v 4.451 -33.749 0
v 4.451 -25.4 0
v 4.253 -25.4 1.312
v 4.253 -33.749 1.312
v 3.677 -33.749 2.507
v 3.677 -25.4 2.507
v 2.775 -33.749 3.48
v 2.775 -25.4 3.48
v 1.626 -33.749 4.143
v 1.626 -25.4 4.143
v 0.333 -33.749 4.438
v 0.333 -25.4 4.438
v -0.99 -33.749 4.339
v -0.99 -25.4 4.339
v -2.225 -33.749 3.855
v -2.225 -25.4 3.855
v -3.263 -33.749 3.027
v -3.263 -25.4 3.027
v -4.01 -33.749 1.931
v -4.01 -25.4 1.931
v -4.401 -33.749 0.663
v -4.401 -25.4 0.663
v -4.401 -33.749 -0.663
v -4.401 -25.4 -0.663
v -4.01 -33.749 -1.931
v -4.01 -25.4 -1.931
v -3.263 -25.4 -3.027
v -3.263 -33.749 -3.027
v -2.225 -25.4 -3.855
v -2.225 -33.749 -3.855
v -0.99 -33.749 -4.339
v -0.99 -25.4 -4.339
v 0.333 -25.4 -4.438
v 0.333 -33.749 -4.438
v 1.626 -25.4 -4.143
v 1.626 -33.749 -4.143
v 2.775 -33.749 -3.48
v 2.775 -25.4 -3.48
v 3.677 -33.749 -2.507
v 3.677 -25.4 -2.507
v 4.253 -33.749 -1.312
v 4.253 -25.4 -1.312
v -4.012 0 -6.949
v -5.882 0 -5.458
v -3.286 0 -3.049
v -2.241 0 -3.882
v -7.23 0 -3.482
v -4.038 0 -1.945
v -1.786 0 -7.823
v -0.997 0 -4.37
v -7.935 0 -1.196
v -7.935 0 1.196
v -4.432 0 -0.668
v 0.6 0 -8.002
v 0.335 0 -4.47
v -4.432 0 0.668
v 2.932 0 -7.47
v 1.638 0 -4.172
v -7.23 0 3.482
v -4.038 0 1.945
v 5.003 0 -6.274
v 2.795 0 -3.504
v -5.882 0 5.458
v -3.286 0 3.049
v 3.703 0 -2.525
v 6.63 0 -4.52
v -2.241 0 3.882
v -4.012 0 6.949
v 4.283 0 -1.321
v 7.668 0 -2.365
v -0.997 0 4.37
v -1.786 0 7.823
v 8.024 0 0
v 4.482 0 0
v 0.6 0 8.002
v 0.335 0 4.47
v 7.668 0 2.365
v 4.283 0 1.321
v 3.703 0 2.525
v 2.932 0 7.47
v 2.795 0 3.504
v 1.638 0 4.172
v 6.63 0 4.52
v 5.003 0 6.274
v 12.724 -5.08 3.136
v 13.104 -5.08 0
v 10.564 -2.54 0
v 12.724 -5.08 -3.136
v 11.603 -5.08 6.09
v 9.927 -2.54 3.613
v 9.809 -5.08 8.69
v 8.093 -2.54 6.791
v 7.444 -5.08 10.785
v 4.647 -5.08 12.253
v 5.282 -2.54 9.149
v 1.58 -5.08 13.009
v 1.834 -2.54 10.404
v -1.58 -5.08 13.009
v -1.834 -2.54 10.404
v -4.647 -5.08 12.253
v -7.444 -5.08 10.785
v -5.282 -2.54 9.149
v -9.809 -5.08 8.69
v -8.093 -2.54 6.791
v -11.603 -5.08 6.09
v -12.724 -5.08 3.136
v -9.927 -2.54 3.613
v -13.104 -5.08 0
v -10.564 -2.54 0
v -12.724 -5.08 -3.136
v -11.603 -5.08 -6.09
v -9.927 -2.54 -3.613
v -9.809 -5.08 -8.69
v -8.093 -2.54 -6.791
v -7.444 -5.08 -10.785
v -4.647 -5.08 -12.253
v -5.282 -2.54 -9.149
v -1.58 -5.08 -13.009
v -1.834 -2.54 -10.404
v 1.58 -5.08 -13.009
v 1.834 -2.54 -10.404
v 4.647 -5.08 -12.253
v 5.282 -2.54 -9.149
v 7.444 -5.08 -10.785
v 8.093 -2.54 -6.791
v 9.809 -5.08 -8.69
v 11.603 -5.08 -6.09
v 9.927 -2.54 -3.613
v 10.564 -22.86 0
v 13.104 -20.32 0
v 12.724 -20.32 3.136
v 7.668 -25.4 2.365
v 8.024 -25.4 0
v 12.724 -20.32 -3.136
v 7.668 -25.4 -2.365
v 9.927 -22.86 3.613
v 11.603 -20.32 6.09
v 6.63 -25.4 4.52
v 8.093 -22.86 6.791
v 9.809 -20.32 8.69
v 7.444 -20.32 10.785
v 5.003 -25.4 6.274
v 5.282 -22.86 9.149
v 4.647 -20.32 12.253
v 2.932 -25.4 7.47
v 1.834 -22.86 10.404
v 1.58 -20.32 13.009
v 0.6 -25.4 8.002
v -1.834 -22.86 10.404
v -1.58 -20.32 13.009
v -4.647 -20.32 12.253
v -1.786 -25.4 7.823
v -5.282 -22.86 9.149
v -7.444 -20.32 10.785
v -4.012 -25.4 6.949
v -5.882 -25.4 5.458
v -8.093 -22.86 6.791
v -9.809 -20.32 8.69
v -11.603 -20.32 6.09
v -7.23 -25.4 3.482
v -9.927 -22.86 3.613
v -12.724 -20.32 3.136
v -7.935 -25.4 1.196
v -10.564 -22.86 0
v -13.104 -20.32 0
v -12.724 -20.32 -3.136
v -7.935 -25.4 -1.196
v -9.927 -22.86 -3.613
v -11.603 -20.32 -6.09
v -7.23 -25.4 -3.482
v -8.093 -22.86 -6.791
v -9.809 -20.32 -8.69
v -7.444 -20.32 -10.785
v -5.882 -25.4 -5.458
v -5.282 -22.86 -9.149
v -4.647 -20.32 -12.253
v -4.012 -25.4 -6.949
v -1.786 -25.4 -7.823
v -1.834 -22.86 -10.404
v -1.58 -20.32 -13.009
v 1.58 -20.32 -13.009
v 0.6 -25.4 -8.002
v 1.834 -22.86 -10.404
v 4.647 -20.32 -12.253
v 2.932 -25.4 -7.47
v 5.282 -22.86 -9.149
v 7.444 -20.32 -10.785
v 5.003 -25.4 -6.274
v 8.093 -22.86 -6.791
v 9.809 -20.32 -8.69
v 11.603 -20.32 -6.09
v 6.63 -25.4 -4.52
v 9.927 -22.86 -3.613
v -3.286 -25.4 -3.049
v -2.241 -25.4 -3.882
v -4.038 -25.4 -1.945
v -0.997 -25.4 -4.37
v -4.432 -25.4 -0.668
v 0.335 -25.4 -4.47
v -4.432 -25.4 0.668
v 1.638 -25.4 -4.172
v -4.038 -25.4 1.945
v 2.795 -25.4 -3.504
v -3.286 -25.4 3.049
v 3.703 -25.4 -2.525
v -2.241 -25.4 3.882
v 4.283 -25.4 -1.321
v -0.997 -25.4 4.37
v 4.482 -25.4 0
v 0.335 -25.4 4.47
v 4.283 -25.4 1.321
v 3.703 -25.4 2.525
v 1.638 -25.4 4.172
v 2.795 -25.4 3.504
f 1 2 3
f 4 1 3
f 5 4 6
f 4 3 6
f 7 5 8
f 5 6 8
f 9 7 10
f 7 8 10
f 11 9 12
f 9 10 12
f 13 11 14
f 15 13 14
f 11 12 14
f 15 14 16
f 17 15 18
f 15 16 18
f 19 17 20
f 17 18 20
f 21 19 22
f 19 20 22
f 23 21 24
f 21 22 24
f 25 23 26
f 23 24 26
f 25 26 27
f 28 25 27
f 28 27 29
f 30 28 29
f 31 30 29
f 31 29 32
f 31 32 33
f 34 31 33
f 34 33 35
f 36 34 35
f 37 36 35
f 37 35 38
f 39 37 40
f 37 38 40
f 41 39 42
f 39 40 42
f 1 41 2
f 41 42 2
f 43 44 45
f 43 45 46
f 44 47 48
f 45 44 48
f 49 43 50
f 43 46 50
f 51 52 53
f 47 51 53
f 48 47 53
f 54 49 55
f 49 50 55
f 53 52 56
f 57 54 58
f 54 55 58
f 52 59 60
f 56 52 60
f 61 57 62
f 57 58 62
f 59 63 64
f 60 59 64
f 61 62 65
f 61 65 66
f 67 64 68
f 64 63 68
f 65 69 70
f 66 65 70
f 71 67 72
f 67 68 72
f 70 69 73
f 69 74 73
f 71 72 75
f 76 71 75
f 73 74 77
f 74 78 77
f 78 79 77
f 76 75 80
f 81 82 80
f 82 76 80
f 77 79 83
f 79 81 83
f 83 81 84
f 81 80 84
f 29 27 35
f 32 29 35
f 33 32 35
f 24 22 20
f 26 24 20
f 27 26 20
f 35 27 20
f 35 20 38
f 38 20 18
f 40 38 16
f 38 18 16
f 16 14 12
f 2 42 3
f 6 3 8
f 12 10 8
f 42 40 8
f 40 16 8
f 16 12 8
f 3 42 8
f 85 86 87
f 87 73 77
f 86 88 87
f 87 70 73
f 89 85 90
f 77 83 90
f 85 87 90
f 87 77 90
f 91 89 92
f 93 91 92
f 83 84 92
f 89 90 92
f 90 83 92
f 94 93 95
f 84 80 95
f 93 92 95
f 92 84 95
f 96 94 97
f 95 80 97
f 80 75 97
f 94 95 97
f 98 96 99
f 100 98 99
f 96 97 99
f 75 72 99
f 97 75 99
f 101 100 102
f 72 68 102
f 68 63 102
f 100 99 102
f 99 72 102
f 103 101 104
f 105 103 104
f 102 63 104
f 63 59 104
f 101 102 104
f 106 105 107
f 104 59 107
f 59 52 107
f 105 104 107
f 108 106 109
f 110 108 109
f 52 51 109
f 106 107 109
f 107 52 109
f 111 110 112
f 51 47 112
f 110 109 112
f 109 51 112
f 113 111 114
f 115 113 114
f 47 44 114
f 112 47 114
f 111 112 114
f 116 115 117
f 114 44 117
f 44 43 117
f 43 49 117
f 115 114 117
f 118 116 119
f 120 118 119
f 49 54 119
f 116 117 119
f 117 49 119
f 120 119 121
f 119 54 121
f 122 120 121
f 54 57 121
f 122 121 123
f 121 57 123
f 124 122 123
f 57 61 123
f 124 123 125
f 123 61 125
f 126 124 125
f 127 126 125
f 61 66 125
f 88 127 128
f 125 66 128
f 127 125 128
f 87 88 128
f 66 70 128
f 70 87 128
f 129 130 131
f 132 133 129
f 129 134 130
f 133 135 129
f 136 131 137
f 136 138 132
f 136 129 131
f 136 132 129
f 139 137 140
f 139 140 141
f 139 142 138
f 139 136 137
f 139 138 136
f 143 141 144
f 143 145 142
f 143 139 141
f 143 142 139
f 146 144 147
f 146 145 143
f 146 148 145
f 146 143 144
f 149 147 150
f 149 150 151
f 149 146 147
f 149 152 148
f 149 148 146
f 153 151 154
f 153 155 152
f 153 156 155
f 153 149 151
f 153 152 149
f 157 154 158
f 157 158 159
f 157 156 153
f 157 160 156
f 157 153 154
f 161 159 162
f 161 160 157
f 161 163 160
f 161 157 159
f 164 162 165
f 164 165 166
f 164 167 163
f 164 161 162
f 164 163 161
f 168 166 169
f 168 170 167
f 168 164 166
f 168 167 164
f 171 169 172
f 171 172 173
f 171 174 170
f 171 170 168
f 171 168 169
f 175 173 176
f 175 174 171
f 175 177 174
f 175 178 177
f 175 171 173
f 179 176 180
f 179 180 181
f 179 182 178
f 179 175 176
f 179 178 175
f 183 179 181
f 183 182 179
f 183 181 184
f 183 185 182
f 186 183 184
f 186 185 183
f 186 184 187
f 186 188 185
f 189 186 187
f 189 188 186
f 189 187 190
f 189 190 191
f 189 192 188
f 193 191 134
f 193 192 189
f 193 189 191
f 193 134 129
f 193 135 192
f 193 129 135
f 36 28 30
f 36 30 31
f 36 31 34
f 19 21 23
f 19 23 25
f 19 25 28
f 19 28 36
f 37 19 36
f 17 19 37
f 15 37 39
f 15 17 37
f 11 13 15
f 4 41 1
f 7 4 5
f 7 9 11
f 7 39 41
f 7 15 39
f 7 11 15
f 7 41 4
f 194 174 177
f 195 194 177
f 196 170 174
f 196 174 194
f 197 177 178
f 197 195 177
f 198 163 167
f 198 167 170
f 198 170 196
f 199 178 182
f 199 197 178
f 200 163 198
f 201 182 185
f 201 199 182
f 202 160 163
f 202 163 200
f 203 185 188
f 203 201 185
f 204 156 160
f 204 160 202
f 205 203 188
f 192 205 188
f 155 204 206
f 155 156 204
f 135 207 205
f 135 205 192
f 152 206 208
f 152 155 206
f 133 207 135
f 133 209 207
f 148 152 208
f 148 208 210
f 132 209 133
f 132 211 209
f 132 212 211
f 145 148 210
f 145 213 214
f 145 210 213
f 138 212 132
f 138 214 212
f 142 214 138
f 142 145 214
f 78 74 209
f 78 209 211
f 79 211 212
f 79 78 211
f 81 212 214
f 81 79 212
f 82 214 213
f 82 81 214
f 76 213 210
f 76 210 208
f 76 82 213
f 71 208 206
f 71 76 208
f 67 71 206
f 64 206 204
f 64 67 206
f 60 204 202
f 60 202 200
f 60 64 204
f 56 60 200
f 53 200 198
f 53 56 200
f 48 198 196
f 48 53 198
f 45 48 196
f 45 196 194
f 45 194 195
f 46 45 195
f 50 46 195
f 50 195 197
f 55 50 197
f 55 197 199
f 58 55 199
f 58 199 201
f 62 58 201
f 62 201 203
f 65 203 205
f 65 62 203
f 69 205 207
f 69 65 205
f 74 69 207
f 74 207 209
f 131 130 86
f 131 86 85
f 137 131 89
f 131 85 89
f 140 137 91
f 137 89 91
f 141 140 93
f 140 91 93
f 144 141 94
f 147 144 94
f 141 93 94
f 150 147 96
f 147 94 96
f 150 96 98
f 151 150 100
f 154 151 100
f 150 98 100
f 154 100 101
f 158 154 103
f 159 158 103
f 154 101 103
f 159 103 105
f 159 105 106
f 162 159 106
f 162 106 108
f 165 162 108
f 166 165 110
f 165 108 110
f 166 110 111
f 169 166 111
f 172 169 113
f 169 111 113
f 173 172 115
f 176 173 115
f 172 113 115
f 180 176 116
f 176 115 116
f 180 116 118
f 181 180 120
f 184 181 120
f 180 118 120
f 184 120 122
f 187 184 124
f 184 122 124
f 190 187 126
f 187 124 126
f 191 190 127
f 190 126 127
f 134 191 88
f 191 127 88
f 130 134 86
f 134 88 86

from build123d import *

# Parameters (mm, degrees)
F0_R     = 13.104446
F0_R_2   = 4.482344
F1_DEPTH = 25.4
F2_R     = 4.450852
F3_DEPTH = 8.34872
F4_SIZE  = 5.08
F5_SIZE  = 5.08


with BuildPart() as f1:
    # F0 (on Front) → F1 (new body)
    with BuildSketch(Plane.XZ):
        Circle(F0_R)
        Circle(F0_R_2, mode=Mode.SUBTRACT)
    extrude(amount=F1_DEPTH)

    # F4
    f4_edges = [f1.edges().sort_by_distance(p)[0] for p in [
        (-13.104446, -25.4, 0),
    ]]
    chamfer(f4_edges, length=F4_SIZE)

    # F5
    f5_edges = [f1.edges().sort_by_distance(p)[0] for p in [
        (-13.104446, 0, 0),
    ]]
    chamfer(f5_edges, length=F5_SIZE)


with BuildPart() as f3:
    # F2 (on face) → F3 (new body)
    with BuildSketch(Plane.XZ.offset(25.4)):
        Circle(F2_R)
    extrude(amount=F3_DEPTH)


solid = Compound([f1.part, f3.part])
